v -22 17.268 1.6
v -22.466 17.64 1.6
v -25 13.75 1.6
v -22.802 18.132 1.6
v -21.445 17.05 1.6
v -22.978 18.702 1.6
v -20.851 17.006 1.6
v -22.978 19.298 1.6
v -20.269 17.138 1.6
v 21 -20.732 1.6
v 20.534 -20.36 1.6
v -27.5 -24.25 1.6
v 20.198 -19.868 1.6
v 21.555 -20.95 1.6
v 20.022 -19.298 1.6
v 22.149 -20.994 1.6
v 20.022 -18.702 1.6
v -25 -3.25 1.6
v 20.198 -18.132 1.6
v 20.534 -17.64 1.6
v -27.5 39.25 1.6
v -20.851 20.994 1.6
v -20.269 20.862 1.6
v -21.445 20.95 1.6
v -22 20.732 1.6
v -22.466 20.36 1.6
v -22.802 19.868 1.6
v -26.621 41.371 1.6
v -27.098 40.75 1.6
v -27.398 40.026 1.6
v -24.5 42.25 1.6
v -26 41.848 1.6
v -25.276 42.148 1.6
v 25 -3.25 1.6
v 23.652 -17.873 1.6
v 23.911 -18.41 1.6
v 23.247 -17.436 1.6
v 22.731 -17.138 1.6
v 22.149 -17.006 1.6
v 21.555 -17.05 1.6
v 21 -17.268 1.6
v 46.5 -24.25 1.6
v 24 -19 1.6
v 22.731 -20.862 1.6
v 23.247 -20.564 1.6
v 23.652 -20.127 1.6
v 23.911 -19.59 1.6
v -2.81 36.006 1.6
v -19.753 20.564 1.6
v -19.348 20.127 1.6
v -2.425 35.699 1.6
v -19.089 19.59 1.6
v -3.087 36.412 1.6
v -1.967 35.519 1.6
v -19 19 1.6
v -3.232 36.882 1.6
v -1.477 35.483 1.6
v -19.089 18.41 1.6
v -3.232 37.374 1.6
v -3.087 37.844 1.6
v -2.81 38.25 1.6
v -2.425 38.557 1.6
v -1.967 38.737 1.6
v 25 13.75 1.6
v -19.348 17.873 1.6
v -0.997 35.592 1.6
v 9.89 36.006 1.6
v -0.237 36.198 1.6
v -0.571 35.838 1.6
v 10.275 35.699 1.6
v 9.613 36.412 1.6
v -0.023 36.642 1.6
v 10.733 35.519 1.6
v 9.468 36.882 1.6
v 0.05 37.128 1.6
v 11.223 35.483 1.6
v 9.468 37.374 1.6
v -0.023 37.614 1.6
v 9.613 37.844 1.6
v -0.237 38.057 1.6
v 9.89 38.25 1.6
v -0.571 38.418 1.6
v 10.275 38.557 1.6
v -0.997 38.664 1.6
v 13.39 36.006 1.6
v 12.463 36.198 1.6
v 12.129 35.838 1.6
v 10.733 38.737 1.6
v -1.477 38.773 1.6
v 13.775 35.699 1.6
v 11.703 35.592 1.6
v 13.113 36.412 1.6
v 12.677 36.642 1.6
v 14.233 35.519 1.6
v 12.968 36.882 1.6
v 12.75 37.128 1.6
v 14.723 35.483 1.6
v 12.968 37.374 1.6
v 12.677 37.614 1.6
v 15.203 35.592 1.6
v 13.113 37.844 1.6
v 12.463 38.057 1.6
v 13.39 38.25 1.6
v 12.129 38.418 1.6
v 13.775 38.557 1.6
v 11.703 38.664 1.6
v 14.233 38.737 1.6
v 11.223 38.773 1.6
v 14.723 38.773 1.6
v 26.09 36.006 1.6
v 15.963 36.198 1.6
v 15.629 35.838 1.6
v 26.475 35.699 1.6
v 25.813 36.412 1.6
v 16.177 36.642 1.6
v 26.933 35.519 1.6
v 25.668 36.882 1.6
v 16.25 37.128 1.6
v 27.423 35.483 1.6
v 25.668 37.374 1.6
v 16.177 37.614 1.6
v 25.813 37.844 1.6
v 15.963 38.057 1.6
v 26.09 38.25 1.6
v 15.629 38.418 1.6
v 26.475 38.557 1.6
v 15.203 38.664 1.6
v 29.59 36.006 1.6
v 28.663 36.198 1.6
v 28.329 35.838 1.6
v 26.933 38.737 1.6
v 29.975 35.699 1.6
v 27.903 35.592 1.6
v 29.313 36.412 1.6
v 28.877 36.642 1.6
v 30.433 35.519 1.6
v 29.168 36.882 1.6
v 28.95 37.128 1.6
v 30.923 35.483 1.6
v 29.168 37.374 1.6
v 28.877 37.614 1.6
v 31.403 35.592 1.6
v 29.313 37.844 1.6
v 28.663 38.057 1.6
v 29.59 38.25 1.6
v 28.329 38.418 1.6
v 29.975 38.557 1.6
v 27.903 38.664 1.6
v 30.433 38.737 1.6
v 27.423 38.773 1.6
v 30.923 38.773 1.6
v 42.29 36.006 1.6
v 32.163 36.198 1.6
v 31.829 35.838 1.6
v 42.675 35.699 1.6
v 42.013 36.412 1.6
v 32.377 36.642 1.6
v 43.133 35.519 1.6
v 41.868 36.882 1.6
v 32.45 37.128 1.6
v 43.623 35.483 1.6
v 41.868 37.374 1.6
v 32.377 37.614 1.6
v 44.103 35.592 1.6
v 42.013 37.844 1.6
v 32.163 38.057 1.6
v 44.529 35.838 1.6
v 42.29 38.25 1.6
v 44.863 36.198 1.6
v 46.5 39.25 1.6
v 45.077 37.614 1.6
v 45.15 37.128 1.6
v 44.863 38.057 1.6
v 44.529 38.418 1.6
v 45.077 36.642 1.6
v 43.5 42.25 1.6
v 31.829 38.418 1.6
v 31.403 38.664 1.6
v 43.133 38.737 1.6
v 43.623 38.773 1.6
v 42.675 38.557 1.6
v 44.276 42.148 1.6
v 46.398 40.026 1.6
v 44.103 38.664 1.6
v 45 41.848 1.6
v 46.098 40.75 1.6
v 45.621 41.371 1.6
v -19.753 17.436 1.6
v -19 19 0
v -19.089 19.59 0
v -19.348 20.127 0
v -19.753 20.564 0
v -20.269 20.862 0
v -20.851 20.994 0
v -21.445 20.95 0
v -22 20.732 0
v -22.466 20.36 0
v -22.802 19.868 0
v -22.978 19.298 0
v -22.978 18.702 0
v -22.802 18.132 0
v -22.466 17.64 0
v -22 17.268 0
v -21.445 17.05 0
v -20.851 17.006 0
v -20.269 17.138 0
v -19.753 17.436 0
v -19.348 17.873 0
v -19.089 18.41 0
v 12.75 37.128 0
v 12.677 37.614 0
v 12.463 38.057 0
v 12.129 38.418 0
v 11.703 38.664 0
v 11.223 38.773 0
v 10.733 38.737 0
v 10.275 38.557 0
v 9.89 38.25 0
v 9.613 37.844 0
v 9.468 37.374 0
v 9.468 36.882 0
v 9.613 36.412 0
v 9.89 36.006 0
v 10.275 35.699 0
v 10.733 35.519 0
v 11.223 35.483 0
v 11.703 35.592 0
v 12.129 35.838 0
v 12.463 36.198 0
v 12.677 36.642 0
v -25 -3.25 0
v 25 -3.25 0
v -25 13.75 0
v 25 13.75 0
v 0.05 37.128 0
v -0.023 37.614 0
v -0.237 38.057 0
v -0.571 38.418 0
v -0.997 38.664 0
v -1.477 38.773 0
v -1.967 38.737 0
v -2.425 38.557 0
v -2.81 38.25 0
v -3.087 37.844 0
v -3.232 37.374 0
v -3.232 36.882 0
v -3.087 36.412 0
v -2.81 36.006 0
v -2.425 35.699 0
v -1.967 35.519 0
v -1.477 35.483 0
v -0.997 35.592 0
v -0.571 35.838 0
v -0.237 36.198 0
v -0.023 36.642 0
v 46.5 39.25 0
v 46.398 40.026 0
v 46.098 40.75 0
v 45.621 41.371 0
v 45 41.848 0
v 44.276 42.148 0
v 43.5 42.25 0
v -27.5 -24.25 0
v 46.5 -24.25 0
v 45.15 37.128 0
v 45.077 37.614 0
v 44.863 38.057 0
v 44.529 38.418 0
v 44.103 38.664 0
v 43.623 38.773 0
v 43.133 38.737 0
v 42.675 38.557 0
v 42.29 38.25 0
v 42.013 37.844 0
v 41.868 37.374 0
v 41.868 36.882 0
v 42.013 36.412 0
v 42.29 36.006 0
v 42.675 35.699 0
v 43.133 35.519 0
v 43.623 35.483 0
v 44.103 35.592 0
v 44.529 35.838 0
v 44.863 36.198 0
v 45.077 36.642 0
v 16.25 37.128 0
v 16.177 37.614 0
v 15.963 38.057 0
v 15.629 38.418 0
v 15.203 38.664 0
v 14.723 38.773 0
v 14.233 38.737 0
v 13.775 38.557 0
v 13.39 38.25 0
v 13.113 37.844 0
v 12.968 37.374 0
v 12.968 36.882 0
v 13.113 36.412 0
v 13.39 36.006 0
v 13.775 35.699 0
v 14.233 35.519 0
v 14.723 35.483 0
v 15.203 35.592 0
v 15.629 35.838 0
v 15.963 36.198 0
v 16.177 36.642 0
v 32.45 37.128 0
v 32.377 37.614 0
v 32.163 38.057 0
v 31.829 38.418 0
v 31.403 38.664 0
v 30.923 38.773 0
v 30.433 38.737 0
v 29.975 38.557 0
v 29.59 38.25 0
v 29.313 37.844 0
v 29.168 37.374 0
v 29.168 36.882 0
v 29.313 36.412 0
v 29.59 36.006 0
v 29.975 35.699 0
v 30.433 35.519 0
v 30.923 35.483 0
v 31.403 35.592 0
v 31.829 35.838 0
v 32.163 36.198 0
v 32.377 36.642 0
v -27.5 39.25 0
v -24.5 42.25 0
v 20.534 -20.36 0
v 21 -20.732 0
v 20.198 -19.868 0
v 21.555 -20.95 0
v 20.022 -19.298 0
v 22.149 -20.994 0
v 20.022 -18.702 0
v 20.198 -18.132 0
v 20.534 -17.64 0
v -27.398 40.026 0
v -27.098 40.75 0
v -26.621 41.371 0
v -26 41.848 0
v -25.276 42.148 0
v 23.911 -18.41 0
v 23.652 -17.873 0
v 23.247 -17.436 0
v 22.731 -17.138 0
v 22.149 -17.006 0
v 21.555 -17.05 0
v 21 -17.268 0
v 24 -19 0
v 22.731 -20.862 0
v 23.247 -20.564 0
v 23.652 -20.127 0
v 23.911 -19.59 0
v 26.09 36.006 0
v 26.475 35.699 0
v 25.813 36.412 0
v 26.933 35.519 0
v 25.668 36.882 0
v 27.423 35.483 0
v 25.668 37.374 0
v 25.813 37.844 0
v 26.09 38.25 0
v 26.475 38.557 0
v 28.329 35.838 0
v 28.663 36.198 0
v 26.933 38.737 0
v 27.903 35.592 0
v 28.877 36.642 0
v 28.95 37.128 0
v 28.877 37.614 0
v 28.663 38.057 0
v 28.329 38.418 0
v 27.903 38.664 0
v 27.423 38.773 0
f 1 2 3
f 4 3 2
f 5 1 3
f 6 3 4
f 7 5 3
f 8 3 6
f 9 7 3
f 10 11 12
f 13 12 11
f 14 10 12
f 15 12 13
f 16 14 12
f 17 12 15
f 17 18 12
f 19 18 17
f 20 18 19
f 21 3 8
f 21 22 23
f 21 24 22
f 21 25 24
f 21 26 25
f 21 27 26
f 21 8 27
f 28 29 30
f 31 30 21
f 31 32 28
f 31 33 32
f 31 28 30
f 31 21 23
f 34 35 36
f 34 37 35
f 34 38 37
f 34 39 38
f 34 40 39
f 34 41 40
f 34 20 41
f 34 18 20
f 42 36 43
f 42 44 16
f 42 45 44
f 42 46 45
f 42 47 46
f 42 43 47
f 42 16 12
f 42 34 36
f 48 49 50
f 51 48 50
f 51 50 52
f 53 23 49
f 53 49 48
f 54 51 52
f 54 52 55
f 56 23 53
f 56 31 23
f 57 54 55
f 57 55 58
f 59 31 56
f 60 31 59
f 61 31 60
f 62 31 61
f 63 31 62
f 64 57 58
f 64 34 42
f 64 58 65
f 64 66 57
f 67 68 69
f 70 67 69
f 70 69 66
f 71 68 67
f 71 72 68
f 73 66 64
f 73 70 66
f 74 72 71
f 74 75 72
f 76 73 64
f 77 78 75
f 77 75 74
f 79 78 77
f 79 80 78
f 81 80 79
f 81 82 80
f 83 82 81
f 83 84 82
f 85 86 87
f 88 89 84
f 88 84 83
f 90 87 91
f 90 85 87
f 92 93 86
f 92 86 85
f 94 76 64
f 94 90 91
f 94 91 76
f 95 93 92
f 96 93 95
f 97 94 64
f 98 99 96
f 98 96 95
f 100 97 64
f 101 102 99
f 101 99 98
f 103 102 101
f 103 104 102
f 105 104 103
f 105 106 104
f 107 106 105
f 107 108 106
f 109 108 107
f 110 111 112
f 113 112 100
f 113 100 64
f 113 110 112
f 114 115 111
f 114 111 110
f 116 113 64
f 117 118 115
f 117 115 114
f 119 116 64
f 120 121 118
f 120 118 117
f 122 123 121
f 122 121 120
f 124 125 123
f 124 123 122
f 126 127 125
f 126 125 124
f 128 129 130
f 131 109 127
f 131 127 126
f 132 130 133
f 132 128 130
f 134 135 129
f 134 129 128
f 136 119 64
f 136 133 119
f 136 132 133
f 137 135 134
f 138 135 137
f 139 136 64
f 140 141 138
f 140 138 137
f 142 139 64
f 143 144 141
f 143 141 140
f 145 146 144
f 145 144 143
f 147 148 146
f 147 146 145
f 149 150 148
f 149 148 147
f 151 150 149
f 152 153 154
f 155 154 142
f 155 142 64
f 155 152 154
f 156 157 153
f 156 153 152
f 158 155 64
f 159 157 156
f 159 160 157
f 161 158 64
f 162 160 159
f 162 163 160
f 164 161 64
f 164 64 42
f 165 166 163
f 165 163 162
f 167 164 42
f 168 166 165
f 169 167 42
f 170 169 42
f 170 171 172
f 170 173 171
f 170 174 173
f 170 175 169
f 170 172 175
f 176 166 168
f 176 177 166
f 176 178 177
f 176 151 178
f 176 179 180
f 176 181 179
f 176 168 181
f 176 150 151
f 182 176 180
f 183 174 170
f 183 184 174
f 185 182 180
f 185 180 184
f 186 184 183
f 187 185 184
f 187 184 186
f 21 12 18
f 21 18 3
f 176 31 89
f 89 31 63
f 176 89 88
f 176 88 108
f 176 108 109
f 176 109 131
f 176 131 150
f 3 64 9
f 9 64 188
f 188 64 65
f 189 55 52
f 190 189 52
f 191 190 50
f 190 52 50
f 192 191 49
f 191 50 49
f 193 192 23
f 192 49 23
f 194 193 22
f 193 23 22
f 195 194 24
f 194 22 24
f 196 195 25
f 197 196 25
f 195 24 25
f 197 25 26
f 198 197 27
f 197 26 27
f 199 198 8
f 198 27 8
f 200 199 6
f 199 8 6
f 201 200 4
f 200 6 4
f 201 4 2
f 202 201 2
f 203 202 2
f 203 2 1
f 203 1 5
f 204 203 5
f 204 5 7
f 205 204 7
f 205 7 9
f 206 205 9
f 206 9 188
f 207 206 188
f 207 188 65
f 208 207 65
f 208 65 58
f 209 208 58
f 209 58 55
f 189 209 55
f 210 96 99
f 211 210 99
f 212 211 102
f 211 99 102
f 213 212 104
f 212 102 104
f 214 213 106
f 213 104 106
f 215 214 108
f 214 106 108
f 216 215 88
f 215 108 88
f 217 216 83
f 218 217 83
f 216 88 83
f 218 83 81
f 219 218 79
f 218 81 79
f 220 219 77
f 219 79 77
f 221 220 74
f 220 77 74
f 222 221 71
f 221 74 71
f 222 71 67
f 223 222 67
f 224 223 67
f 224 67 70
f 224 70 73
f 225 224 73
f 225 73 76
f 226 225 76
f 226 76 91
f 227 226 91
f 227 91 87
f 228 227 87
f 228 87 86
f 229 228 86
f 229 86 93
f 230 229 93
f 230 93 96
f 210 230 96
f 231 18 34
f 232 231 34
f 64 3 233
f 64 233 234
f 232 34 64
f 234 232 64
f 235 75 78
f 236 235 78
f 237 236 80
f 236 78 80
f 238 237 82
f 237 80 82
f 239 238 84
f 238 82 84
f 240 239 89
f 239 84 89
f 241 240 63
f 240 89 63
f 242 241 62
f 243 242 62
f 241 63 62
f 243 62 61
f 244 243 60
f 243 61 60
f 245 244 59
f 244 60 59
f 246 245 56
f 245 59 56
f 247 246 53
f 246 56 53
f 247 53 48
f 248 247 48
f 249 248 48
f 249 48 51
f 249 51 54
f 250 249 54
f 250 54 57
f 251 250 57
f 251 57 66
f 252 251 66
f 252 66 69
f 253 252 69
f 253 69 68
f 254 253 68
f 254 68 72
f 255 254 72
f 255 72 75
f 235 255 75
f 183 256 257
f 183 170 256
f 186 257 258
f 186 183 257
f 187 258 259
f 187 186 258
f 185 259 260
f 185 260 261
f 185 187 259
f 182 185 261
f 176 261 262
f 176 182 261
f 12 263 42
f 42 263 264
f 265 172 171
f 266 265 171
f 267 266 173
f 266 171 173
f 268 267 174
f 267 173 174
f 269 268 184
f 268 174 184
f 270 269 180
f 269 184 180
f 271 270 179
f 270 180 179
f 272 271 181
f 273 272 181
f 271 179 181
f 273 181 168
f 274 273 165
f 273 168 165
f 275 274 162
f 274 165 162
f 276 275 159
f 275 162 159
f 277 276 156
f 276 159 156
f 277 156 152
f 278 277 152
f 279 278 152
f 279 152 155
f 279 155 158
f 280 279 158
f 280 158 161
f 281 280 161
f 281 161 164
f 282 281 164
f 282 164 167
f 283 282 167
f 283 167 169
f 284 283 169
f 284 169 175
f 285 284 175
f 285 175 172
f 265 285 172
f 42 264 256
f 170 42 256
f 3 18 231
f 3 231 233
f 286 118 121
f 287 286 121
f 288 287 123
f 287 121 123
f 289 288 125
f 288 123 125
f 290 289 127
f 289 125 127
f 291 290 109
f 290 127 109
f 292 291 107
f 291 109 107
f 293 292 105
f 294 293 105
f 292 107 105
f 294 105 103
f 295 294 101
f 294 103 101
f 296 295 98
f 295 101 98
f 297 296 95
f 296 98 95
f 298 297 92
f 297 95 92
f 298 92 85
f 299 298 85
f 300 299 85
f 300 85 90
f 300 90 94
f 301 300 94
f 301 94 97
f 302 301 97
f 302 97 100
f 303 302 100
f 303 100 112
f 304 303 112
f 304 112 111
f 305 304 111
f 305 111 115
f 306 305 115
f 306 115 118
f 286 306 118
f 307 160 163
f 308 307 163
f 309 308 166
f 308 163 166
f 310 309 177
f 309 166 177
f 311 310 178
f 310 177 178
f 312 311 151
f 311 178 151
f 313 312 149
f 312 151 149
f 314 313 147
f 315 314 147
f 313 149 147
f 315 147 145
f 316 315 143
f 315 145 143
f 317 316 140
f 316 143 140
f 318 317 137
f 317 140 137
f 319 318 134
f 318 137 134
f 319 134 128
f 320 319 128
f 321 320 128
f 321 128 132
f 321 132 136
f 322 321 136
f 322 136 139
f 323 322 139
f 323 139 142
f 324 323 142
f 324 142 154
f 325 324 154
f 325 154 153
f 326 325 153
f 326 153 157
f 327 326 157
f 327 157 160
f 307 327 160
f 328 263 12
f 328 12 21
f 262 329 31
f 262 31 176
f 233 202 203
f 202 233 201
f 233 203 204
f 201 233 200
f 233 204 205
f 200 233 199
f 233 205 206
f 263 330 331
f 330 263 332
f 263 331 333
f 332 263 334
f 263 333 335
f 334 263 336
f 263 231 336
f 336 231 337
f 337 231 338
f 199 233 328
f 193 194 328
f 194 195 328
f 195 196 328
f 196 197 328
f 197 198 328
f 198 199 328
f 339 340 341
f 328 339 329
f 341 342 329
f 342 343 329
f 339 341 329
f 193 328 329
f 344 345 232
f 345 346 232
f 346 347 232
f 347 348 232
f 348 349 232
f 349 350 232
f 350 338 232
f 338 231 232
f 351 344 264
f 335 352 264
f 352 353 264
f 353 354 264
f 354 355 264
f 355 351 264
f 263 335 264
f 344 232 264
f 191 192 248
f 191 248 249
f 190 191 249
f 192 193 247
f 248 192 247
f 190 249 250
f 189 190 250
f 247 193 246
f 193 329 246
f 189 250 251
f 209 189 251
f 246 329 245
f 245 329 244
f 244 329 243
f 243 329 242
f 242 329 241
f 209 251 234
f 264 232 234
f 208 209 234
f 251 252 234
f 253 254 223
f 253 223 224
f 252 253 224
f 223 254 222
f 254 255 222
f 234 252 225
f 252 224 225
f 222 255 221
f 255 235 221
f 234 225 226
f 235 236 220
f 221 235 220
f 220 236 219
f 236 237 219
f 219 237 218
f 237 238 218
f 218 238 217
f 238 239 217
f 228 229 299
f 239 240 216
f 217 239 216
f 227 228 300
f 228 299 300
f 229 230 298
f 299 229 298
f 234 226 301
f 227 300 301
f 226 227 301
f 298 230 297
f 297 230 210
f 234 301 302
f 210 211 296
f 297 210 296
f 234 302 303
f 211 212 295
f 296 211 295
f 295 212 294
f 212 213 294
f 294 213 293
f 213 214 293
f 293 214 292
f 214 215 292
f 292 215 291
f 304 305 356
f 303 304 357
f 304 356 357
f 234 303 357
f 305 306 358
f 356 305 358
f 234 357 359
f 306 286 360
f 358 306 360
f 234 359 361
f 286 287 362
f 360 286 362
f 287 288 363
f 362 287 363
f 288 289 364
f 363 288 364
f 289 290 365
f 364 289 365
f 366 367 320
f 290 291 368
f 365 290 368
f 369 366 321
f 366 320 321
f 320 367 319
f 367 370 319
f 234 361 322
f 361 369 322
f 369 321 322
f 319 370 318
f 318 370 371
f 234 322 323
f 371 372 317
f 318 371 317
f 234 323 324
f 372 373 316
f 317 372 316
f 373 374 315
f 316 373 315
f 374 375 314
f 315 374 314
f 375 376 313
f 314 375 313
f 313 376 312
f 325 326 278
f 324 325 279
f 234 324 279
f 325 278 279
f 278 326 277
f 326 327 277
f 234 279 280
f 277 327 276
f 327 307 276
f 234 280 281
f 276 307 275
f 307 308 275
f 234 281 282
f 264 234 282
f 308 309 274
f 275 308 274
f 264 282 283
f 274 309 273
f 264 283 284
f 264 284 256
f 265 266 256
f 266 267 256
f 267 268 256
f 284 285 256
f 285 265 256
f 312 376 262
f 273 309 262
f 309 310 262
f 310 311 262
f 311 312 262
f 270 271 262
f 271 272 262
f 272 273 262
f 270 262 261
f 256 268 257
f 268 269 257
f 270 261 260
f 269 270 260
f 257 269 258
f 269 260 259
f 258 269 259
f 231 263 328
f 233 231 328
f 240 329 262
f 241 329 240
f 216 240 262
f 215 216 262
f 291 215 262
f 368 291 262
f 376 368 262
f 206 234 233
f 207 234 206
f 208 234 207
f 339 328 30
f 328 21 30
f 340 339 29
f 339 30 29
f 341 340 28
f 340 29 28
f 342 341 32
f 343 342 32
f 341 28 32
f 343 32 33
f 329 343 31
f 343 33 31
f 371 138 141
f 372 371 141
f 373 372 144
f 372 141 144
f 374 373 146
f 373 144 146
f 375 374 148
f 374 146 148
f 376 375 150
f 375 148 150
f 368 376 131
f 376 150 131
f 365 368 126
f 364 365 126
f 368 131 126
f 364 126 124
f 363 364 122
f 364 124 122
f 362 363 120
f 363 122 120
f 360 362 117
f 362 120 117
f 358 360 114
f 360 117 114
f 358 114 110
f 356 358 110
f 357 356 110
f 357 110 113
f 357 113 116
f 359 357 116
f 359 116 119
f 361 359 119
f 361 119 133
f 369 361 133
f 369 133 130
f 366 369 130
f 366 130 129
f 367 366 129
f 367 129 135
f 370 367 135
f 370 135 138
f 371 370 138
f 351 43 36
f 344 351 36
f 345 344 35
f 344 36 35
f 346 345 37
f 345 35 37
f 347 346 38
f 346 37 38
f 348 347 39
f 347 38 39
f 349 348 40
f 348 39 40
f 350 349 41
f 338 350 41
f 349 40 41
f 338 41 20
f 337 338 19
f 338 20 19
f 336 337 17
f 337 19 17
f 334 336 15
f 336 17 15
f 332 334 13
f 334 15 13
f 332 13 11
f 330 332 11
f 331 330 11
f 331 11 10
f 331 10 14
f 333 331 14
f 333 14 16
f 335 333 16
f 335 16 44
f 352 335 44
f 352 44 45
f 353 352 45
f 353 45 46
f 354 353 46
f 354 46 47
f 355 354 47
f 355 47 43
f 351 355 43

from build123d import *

# Parameters (mm, degrees)
F0_W     = 74
F0_H     = 66.5
F1_DEPTH = 1.6
F2_R     = 3
F3_R     = 2
F3_W     = 50
F3_H     = 17
F3_R_2   = 1.65
F4_DEPTH = 25


with BuildPart() as f1:
    # F0 (on Top) → F1 (new body)
    with BuildSketch(Plane.XY):
        with Locations((9.5, 9)):
            Rectangle(F0_W, F0_H)
    extrude(amount=F1_DEPTH)

    # F2
    f2_edges = [f1.edges().sort_by_distance(p)[0] for p in [
        (-27.5, 42.25, 0.8),
        (46.5, 42.25, 0.8),
    ]]
    fillet(f2_edges, radius=F2_R)

    # F3 (on face) → F4 (cut)
    with BuildSketch(Plane.XY.offset(1.6)):
        with Locations((-21, 19)):
            Circle(F3_R)
        with Locations((22, -19)):
            Circle(F3_R)
        with Locations((0, 5.25)):
            Rectangle(F3_W, F3_H)
        with Locations((-1.6, 37.127893)):
            Circle(F3_R_2)
        with Locations((11.1, 37.127893)):
            Circle(F3_R_2)
        with Locations((14.6, 37.127893)):
            Circle(F3_R_2)
        with Locations((27.3, 37.127893)):
            Circle(F3_R_2)
        with Locations((30.8, 37.127893)):
            Circle(F3_R_2)
        with Locations((43.5, 37.127893)):
            Circle(F3_R_2)
    extrude(amount=-F4_DEPTH, mode=Mode.SUBTRACT)


solid = f1.part
